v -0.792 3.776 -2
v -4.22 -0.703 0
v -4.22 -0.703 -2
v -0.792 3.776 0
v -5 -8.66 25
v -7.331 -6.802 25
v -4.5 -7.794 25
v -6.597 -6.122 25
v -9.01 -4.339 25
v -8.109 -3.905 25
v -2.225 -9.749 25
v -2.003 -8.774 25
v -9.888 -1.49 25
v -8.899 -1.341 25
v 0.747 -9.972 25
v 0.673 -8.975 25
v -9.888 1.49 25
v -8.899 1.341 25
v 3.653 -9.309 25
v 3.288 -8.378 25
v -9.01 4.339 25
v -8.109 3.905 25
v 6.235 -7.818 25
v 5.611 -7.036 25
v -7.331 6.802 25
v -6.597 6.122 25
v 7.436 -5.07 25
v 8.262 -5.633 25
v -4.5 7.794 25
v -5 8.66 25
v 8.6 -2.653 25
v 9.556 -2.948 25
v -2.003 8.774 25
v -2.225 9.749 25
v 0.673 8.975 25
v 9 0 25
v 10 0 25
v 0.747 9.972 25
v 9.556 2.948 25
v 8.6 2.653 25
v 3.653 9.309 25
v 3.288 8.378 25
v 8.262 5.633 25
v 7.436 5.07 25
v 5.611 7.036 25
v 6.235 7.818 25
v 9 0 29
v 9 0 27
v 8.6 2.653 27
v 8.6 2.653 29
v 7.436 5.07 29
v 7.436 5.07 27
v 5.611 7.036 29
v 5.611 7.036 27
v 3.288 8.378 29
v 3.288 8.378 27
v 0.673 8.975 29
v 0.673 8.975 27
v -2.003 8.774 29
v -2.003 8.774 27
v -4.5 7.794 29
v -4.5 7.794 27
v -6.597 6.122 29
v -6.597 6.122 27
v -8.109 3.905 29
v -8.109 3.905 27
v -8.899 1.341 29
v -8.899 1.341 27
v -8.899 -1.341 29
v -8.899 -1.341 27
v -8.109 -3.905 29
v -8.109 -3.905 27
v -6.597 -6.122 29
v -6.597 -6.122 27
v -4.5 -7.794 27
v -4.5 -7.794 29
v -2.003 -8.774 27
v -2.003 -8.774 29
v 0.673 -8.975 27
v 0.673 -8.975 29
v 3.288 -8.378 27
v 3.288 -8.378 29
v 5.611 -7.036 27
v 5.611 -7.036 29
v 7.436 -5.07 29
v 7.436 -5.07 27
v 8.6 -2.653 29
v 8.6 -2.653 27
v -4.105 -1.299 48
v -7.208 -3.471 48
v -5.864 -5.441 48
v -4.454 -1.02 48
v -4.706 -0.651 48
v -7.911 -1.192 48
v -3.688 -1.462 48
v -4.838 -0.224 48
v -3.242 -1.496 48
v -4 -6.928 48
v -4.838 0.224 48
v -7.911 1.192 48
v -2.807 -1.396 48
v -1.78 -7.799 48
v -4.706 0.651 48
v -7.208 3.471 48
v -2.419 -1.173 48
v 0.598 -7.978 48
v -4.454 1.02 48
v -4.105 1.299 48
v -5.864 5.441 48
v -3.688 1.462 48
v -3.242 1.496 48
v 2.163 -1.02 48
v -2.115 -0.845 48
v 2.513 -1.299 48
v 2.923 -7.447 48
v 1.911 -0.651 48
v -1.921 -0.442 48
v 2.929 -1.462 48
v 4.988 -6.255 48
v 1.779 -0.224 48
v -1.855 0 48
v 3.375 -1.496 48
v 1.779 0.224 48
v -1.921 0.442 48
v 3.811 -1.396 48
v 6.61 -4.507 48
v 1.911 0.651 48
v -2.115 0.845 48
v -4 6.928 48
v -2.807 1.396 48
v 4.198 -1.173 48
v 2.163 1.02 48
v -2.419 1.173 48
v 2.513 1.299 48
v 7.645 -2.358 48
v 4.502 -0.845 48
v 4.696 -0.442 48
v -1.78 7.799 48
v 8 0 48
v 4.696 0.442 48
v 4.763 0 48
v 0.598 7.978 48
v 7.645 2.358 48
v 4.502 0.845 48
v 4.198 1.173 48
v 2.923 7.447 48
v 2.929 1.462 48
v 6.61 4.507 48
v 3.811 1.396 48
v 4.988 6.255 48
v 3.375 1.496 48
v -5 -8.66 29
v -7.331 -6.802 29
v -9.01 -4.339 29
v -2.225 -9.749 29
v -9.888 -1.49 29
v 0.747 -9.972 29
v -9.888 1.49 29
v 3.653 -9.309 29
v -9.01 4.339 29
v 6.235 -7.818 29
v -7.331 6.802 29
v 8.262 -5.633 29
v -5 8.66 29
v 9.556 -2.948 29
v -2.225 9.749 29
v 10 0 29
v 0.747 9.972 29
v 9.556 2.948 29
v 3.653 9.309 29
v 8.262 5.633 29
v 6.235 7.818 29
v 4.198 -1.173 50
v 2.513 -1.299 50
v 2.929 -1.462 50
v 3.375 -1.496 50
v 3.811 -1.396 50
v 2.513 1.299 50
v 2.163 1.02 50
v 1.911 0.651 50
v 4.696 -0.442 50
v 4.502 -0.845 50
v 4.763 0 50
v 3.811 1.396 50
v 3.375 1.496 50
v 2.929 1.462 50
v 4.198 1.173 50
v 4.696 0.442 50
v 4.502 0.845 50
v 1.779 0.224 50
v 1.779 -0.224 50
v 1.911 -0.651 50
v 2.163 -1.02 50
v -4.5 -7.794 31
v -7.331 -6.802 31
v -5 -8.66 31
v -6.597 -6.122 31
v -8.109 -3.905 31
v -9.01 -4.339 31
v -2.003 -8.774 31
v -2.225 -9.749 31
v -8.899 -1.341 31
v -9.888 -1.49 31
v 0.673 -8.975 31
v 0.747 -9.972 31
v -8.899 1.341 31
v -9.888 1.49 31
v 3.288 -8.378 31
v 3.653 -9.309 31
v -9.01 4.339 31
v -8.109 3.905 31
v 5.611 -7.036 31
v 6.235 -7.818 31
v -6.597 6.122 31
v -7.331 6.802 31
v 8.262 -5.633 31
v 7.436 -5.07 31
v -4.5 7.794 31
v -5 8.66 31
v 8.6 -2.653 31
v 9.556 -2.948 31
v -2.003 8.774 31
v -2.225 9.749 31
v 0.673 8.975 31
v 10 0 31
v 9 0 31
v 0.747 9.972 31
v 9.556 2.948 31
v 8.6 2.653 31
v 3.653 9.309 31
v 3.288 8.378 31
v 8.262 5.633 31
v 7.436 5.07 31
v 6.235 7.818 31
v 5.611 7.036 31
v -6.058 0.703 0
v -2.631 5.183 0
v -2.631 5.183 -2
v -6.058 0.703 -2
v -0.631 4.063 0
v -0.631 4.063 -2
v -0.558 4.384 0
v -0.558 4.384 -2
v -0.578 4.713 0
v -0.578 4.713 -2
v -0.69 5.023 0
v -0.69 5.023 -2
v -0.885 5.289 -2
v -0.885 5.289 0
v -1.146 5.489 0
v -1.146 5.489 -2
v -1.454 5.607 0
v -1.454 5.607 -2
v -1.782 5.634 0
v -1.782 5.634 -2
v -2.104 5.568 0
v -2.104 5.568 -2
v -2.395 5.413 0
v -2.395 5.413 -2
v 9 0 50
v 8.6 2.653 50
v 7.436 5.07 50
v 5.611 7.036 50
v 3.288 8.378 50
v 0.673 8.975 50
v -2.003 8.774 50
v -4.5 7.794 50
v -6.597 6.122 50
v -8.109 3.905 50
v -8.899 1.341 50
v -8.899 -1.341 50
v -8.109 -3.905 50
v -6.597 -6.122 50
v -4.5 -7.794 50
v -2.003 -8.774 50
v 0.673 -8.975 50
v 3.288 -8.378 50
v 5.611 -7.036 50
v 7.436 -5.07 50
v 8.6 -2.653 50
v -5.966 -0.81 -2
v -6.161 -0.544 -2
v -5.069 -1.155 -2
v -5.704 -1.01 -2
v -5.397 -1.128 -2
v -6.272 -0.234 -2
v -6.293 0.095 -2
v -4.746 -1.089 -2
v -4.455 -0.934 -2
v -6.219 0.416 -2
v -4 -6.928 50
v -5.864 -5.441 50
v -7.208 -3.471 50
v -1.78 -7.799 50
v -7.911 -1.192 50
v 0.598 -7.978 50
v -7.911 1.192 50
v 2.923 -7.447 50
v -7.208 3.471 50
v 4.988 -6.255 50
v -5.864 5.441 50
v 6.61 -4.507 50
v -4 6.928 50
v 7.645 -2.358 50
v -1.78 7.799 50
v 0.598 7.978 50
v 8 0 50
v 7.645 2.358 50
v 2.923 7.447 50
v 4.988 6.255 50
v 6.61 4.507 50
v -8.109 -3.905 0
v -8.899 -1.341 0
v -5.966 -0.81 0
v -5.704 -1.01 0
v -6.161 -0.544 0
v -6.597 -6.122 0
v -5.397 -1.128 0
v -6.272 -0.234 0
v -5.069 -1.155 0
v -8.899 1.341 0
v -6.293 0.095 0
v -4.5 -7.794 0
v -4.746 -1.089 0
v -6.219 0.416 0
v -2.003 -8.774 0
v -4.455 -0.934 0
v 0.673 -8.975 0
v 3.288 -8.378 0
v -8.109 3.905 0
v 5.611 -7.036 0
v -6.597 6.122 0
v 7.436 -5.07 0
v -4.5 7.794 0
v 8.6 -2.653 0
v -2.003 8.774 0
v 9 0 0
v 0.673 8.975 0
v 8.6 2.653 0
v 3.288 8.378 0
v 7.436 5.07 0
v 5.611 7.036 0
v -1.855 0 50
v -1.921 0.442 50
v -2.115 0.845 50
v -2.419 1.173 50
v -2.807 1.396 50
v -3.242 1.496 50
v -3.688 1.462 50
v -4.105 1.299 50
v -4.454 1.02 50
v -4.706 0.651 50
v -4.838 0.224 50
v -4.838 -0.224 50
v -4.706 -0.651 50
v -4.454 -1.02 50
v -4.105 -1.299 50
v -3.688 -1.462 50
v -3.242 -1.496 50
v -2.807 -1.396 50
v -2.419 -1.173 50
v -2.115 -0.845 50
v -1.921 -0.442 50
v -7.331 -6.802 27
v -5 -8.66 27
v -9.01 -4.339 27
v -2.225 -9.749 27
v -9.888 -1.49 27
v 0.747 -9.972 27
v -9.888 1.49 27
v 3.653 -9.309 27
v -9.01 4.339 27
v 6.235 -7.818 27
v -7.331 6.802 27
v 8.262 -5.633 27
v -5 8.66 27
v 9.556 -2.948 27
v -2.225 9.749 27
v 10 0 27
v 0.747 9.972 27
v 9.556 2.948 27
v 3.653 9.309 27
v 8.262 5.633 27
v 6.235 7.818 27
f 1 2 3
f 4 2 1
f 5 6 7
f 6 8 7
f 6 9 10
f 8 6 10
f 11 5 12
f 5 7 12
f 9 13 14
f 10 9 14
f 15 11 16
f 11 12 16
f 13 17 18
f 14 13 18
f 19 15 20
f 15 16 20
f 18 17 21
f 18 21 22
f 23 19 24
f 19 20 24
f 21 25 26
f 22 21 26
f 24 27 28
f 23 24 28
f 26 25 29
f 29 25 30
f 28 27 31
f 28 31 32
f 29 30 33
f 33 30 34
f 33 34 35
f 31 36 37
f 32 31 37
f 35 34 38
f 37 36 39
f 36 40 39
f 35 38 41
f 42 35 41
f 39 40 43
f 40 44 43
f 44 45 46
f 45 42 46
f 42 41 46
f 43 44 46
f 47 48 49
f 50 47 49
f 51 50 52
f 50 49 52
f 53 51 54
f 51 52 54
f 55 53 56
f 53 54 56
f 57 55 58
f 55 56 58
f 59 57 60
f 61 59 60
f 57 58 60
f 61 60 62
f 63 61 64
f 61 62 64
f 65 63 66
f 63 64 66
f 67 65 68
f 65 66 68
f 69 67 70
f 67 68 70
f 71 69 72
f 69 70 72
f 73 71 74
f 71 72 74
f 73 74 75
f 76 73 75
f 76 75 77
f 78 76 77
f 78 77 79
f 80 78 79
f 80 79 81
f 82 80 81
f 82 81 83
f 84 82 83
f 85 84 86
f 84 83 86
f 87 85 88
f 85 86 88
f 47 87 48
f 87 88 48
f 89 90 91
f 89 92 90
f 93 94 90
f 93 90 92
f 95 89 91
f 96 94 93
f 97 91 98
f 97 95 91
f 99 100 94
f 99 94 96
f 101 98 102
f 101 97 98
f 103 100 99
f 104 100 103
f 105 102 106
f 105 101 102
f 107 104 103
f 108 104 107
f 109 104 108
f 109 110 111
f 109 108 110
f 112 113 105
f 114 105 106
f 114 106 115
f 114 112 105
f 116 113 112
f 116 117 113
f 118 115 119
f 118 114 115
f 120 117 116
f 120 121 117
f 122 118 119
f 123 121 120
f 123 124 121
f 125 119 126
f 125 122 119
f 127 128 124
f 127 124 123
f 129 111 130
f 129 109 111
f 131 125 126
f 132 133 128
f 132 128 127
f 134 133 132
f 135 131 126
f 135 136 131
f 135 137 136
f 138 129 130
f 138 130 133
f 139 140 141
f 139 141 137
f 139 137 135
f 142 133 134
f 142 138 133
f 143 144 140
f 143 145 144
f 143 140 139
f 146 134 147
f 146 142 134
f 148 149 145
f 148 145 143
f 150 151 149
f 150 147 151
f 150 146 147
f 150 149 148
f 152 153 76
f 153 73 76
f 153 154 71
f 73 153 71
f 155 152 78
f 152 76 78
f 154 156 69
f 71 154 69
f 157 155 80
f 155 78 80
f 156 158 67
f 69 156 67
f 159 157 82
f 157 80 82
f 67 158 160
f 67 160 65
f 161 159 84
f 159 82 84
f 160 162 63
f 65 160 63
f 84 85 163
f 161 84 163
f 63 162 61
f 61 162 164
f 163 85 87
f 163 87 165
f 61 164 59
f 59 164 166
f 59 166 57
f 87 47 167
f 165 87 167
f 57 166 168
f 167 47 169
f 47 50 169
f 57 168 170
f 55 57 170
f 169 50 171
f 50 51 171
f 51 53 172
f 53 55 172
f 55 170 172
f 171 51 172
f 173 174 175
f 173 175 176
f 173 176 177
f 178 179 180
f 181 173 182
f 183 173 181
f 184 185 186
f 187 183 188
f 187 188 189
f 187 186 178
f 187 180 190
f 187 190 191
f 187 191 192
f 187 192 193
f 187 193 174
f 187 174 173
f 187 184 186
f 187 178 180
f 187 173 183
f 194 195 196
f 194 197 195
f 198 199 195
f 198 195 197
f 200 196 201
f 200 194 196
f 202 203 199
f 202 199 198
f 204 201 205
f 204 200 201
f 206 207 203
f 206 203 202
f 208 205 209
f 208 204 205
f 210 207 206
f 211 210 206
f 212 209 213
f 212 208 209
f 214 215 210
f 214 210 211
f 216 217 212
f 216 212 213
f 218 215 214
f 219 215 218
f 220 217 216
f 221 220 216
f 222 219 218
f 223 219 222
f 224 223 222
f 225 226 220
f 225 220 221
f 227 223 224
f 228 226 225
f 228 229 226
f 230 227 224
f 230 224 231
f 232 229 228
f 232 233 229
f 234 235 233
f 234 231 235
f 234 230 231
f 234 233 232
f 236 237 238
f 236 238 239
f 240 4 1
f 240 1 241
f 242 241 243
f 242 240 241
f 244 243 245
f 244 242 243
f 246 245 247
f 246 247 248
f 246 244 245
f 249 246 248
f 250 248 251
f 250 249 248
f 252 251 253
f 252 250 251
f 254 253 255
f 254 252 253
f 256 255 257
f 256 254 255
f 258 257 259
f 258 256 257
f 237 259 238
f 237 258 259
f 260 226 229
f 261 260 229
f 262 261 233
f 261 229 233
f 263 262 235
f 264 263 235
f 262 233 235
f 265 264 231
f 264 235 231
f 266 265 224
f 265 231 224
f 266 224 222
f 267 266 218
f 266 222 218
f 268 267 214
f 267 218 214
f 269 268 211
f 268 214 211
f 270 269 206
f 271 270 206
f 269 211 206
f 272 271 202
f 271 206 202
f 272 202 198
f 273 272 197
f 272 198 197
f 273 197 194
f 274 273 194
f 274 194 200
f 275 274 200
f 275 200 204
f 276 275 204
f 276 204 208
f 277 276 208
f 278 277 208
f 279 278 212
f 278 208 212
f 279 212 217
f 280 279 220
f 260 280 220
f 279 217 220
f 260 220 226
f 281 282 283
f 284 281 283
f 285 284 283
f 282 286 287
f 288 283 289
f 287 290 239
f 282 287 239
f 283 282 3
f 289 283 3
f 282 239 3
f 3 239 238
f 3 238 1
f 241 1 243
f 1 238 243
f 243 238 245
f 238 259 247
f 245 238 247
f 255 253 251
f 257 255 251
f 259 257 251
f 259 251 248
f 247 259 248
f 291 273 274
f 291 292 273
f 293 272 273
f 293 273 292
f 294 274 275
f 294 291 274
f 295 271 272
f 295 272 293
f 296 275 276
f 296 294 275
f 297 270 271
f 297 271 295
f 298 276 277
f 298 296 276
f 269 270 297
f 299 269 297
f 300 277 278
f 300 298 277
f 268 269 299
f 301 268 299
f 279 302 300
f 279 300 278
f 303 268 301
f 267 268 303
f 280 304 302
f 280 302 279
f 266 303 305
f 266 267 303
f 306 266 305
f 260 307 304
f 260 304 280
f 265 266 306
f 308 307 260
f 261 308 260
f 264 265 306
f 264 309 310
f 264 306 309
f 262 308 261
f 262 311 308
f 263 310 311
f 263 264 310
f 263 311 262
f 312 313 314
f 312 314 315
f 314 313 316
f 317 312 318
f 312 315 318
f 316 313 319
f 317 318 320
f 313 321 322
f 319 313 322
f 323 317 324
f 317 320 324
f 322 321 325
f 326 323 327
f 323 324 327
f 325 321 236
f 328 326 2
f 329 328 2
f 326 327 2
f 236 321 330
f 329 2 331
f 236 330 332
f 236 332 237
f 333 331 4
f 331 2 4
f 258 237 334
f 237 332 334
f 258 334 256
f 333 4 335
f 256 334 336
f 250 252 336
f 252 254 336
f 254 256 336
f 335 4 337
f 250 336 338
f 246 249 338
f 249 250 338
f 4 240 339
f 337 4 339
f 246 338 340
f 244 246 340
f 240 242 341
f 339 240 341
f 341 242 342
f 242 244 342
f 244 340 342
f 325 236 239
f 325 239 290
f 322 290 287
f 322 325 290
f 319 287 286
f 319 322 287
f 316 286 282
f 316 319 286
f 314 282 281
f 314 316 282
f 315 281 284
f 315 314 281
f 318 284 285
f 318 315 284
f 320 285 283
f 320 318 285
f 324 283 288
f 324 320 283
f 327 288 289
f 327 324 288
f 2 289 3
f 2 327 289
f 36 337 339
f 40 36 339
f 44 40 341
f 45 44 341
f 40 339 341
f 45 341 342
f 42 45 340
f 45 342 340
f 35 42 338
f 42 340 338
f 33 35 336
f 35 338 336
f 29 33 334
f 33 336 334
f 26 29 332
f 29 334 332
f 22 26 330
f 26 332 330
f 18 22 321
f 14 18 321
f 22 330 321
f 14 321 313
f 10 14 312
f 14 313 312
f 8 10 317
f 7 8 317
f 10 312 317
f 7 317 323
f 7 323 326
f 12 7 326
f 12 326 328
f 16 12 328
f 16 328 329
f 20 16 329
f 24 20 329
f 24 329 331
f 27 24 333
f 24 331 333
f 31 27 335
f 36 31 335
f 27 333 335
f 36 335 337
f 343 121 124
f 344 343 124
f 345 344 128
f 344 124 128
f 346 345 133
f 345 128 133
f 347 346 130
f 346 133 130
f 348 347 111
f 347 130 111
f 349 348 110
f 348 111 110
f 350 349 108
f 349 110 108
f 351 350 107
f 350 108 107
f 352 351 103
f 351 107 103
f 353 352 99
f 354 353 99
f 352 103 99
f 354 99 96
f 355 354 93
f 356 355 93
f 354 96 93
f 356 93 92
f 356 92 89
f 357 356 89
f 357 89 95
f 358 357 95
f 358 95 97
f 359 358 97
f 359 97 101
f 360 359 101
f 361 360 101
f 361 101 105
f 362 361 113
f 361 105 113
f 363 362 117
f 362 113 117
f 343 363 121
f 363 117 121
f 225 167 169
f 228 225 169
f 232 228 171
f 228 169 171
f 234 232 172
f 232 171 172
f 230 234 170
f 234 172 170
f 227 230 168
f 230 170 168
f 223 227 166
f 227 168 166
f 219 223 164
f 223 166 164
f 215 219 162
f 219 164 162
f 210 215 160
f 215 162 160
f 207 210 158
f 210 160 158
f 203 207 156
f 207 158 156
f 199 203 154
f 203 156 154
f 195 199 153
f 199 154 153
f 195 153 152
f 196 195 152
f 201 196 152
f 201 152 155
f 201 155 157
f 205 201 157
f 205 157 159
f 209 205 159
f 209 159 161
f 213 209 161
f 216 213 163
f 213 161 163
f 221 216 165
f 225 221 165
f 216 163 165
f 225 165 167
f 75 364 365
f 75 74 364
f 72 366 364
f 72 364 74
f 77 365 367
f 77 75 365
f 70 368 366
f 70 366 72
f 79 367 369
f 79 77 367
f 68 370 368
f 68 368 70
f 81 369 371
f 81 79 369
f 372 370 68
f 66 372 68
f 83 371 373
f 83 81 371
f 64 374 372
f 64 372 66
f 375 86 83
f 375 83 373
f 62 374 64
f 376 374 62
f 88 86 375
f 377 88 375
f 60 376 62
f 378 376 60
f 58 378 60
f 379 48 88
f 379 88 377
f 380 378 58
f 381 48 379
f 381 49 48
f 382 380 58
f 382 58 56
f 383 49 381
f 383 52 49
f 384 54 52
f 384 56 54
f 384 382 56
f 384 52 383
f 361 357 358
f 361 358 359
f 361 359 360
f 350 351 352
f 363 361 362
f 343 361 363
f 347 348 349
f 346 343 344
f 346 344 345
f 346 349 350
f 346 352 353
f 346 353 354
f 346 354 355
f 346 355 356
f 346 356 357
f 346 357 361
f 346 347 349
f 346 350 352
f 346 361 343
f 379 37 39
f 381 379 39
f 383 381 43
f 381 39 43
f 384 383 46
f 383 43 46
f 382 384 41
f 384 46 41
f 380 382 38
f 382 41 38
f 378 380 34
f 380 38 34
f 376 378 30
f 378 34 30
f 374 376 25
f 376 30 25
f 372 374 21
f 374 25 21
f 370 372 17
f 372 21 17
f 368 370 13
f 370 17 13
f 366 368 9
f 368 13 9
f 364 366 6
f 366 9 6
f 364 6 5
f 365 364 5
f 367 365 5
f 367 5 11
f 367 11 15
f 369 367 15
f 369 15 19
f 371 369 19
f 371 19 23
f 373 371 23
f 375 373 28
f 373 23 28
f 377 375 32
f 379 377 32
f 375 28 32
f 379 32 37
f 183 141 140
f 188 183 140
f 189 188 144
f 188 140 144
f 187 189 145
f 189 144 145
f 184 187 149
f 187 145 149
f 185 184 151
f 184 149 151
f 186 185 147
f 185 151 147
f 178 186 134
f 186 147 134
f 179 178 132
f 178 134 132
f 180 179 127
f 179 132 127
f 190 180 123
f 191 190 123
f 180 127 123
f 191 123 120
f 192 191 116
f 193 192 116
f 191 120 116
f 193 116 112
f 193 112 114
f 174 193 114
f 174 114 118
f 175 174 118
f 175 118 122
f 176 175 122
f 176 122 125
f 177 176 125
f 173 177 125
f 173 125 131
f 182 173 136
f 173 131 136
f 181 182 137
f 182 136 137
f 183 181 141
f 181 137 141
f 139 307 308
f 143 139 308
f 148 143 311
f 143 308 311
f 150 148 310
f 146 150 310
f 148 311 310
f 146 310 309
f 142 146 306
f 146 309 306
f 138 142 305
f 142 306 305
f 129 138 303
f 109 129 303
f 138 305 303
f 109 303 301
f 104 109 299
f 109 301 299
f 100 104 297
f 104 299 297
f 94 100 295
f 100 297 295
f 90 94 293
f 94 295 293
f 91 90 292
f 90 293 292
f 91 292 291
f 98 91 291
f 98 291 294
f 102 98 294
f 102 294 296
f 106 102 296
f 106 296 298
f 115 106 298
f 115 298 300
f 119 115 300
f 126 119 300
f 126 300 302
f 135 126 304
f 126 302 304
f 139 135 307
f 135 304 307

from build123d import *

# Parameters (mm, degrees)
SKETCH1_R           = 9
BOSS_EXTRUDE1_DEPTH = 25
SKETCH3_R           = 10
BOSS_EXTRUDE2_DEPTH = 2
SKETCH4_R           = 9
BOSS_EXTRUDE3_DEPTH = 2
SKETCH5_R           = 10
BOSS_EXTRUDE4_DEPTH = 2
SKETCH6_R           = 9
BOSS_EXTRUDE5_DEPTH = 19
SKETCH7_R           = 8
CUT_EXTRUDE1_DEPTH  = 2
SKETCH8_R           = 1.5
BOSS_EXTRUDE6_DEPTH = 2
BOSS_EXTRUDE7_DEPTH = 2


with BuildPart() as part:
    # Sketch1 → Boss-Extrude1 (new body)
    with BuildSketch(Plane.XY):
        Circle(SKETCH1_R)
    extrude(amount=BOSS_EXTRUDE1_DEPTH)

    # Sketch3 → Boss-Extrude2 (add)
    with BuildSketch(Plane.XY.offset(25)):
        Circle(SKETCH3_R)
    extrude(amount=BOSS_EXTRUDE2_DEPTH)

    # Sketch4 → Boss-Extrude3 (add)
    with BuildSketch(Plane.XY.offset(27)):
        Circle(SKETCH4_R)
    extrude(amount=BOSS_EXTRUDE3_DEPTH)

    # Sketch5 → Boss-Extrude4 (add)
    with BuildSketch(Plane.XY.offset(29)):
        Circle(SKETCH5_R)
    extrude(amount=BOSS_EXTRUDE4_DEPTH)

    # Sketch6 → Boss-Extrude5 (add)
    with BuildSketch(Plane.XY.offset(31)):
        Circle(SKETCH6_R)
    extrude(amount=BOSS_EXTRUDE5_DEPTH)

    # Sketch7 → Cut-Extrude1 (cut)
    with BuildSketch(Plane.XY.offset(50)):
        Circle(SKETCH7_R)
    extrude(amount=-CUT_EXTRUDE1_DEPTH, mode=Mode.SUBTRACT)

    # Sketch8 → Boss-Extrude6 (add)
    with BuildSketch(Plane.XY.offset(48)):
        with Locations((-3.354571174, 0)):
            Circle(SKETCH8_R)
        with Locations((3.262554329, 0)):
            Circle(SKETCH8_R)
    extrude(amount=BOSS_EXTRUDE6_DEPTH)

    # Sketch9 → Boss-Extrude7 (add)
    with BuildSketch(Plane(origin=(0, 0, 0), x_dir=(-1, 0, 0), z_dir=(0, 0, -1))):
        with BuildLine():
            Line((2.630574057, 5.182535367), (6.058172796, 0.703309821))
            ThreePointArc((6.058172796, 0.703309821), (5.842389235, -0.919093383), (4.219986031, -0.703309821))
            Line((4.219986031, -0.703309821), (0.792387292, 3.775915724))
            ThreePointArc((0.792387292, 3.775915724), (1.008170853, 5.398318928), (2.630574057, 5.182535367))
        make_face()
    extrude(amount=BOSS_EXTRUDE7_DEPTH)


solid = part.part
